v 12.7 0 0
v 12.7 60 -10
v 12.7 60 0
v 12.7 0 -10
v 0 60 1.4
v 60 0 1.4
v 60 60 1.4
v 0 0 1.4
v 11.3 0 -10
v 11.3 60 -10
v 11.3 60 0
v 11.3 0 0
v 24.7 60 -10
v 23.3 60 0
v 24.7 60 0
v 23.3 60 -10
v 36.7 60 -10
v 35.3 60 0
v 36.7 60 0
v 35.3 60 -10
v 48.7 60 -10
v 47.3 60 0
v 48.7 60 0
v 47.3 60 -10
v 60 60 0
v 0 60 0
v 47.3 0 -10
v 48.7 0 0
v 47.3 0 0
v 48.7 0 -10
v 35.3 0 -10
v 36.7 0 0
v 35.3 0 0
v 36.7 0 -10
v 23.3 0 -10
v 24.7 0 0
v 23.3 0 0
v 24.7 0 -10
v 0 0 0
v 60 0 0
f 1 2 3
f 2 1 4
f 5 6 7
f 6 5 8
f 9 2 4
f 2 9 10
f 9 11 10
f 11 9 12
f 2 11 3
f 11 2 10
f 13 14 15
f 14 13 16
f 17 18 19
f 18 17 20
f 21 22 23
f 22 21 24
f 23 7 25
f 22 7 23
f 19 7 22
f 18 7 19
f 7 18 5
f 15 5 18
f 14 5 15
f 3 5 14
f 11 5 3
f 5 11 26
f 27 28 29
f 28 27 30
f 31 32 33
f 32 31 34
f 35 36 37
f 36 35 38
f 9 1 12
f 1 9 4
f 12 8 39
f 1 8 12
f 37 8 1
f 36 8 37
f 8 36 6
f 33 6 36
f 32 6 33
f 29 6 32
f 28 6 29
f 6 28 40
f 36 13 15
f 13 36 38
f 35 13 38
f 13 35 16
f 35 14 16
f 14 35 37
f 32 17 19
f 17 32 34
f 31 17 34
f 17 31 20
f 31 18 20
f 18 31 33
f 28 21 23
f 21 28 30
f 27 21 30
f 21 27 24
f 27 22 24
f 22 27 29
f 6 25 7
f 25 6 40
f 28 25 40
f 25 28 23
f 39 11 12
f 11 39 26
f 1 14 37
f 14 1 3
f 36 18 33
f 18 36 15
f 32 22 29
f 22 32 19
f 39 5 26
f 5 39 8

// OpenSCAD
$fn = 32;

// ----------------------------------------------------------------------
// Ribbed panel: 1.4 mm panel
// ----------------------------------------------------------------------

// --- parameters (mm) ---
panel_l = 60;             // panel length, X
panel_w = 60;             // panel width, Y
panel_t = 1.4;            // panel thickness, Z
rib_t = 1.4;              // rib thickness
rib_h = 10;               // rib height below the panel
ribs = 4;                 // number of ribs

total_h = panel_t + rib_h;  // overall height

union() {
  cube([panel_l, panel_w, panel_t]);
  for (i = [1 : ribs])
    translate([i * panel_l / (ribs + 1) - rib_t / 2, 0, -rib_h])
      cube([rib_t, panel_w, rib_h + panel_t]);
}
